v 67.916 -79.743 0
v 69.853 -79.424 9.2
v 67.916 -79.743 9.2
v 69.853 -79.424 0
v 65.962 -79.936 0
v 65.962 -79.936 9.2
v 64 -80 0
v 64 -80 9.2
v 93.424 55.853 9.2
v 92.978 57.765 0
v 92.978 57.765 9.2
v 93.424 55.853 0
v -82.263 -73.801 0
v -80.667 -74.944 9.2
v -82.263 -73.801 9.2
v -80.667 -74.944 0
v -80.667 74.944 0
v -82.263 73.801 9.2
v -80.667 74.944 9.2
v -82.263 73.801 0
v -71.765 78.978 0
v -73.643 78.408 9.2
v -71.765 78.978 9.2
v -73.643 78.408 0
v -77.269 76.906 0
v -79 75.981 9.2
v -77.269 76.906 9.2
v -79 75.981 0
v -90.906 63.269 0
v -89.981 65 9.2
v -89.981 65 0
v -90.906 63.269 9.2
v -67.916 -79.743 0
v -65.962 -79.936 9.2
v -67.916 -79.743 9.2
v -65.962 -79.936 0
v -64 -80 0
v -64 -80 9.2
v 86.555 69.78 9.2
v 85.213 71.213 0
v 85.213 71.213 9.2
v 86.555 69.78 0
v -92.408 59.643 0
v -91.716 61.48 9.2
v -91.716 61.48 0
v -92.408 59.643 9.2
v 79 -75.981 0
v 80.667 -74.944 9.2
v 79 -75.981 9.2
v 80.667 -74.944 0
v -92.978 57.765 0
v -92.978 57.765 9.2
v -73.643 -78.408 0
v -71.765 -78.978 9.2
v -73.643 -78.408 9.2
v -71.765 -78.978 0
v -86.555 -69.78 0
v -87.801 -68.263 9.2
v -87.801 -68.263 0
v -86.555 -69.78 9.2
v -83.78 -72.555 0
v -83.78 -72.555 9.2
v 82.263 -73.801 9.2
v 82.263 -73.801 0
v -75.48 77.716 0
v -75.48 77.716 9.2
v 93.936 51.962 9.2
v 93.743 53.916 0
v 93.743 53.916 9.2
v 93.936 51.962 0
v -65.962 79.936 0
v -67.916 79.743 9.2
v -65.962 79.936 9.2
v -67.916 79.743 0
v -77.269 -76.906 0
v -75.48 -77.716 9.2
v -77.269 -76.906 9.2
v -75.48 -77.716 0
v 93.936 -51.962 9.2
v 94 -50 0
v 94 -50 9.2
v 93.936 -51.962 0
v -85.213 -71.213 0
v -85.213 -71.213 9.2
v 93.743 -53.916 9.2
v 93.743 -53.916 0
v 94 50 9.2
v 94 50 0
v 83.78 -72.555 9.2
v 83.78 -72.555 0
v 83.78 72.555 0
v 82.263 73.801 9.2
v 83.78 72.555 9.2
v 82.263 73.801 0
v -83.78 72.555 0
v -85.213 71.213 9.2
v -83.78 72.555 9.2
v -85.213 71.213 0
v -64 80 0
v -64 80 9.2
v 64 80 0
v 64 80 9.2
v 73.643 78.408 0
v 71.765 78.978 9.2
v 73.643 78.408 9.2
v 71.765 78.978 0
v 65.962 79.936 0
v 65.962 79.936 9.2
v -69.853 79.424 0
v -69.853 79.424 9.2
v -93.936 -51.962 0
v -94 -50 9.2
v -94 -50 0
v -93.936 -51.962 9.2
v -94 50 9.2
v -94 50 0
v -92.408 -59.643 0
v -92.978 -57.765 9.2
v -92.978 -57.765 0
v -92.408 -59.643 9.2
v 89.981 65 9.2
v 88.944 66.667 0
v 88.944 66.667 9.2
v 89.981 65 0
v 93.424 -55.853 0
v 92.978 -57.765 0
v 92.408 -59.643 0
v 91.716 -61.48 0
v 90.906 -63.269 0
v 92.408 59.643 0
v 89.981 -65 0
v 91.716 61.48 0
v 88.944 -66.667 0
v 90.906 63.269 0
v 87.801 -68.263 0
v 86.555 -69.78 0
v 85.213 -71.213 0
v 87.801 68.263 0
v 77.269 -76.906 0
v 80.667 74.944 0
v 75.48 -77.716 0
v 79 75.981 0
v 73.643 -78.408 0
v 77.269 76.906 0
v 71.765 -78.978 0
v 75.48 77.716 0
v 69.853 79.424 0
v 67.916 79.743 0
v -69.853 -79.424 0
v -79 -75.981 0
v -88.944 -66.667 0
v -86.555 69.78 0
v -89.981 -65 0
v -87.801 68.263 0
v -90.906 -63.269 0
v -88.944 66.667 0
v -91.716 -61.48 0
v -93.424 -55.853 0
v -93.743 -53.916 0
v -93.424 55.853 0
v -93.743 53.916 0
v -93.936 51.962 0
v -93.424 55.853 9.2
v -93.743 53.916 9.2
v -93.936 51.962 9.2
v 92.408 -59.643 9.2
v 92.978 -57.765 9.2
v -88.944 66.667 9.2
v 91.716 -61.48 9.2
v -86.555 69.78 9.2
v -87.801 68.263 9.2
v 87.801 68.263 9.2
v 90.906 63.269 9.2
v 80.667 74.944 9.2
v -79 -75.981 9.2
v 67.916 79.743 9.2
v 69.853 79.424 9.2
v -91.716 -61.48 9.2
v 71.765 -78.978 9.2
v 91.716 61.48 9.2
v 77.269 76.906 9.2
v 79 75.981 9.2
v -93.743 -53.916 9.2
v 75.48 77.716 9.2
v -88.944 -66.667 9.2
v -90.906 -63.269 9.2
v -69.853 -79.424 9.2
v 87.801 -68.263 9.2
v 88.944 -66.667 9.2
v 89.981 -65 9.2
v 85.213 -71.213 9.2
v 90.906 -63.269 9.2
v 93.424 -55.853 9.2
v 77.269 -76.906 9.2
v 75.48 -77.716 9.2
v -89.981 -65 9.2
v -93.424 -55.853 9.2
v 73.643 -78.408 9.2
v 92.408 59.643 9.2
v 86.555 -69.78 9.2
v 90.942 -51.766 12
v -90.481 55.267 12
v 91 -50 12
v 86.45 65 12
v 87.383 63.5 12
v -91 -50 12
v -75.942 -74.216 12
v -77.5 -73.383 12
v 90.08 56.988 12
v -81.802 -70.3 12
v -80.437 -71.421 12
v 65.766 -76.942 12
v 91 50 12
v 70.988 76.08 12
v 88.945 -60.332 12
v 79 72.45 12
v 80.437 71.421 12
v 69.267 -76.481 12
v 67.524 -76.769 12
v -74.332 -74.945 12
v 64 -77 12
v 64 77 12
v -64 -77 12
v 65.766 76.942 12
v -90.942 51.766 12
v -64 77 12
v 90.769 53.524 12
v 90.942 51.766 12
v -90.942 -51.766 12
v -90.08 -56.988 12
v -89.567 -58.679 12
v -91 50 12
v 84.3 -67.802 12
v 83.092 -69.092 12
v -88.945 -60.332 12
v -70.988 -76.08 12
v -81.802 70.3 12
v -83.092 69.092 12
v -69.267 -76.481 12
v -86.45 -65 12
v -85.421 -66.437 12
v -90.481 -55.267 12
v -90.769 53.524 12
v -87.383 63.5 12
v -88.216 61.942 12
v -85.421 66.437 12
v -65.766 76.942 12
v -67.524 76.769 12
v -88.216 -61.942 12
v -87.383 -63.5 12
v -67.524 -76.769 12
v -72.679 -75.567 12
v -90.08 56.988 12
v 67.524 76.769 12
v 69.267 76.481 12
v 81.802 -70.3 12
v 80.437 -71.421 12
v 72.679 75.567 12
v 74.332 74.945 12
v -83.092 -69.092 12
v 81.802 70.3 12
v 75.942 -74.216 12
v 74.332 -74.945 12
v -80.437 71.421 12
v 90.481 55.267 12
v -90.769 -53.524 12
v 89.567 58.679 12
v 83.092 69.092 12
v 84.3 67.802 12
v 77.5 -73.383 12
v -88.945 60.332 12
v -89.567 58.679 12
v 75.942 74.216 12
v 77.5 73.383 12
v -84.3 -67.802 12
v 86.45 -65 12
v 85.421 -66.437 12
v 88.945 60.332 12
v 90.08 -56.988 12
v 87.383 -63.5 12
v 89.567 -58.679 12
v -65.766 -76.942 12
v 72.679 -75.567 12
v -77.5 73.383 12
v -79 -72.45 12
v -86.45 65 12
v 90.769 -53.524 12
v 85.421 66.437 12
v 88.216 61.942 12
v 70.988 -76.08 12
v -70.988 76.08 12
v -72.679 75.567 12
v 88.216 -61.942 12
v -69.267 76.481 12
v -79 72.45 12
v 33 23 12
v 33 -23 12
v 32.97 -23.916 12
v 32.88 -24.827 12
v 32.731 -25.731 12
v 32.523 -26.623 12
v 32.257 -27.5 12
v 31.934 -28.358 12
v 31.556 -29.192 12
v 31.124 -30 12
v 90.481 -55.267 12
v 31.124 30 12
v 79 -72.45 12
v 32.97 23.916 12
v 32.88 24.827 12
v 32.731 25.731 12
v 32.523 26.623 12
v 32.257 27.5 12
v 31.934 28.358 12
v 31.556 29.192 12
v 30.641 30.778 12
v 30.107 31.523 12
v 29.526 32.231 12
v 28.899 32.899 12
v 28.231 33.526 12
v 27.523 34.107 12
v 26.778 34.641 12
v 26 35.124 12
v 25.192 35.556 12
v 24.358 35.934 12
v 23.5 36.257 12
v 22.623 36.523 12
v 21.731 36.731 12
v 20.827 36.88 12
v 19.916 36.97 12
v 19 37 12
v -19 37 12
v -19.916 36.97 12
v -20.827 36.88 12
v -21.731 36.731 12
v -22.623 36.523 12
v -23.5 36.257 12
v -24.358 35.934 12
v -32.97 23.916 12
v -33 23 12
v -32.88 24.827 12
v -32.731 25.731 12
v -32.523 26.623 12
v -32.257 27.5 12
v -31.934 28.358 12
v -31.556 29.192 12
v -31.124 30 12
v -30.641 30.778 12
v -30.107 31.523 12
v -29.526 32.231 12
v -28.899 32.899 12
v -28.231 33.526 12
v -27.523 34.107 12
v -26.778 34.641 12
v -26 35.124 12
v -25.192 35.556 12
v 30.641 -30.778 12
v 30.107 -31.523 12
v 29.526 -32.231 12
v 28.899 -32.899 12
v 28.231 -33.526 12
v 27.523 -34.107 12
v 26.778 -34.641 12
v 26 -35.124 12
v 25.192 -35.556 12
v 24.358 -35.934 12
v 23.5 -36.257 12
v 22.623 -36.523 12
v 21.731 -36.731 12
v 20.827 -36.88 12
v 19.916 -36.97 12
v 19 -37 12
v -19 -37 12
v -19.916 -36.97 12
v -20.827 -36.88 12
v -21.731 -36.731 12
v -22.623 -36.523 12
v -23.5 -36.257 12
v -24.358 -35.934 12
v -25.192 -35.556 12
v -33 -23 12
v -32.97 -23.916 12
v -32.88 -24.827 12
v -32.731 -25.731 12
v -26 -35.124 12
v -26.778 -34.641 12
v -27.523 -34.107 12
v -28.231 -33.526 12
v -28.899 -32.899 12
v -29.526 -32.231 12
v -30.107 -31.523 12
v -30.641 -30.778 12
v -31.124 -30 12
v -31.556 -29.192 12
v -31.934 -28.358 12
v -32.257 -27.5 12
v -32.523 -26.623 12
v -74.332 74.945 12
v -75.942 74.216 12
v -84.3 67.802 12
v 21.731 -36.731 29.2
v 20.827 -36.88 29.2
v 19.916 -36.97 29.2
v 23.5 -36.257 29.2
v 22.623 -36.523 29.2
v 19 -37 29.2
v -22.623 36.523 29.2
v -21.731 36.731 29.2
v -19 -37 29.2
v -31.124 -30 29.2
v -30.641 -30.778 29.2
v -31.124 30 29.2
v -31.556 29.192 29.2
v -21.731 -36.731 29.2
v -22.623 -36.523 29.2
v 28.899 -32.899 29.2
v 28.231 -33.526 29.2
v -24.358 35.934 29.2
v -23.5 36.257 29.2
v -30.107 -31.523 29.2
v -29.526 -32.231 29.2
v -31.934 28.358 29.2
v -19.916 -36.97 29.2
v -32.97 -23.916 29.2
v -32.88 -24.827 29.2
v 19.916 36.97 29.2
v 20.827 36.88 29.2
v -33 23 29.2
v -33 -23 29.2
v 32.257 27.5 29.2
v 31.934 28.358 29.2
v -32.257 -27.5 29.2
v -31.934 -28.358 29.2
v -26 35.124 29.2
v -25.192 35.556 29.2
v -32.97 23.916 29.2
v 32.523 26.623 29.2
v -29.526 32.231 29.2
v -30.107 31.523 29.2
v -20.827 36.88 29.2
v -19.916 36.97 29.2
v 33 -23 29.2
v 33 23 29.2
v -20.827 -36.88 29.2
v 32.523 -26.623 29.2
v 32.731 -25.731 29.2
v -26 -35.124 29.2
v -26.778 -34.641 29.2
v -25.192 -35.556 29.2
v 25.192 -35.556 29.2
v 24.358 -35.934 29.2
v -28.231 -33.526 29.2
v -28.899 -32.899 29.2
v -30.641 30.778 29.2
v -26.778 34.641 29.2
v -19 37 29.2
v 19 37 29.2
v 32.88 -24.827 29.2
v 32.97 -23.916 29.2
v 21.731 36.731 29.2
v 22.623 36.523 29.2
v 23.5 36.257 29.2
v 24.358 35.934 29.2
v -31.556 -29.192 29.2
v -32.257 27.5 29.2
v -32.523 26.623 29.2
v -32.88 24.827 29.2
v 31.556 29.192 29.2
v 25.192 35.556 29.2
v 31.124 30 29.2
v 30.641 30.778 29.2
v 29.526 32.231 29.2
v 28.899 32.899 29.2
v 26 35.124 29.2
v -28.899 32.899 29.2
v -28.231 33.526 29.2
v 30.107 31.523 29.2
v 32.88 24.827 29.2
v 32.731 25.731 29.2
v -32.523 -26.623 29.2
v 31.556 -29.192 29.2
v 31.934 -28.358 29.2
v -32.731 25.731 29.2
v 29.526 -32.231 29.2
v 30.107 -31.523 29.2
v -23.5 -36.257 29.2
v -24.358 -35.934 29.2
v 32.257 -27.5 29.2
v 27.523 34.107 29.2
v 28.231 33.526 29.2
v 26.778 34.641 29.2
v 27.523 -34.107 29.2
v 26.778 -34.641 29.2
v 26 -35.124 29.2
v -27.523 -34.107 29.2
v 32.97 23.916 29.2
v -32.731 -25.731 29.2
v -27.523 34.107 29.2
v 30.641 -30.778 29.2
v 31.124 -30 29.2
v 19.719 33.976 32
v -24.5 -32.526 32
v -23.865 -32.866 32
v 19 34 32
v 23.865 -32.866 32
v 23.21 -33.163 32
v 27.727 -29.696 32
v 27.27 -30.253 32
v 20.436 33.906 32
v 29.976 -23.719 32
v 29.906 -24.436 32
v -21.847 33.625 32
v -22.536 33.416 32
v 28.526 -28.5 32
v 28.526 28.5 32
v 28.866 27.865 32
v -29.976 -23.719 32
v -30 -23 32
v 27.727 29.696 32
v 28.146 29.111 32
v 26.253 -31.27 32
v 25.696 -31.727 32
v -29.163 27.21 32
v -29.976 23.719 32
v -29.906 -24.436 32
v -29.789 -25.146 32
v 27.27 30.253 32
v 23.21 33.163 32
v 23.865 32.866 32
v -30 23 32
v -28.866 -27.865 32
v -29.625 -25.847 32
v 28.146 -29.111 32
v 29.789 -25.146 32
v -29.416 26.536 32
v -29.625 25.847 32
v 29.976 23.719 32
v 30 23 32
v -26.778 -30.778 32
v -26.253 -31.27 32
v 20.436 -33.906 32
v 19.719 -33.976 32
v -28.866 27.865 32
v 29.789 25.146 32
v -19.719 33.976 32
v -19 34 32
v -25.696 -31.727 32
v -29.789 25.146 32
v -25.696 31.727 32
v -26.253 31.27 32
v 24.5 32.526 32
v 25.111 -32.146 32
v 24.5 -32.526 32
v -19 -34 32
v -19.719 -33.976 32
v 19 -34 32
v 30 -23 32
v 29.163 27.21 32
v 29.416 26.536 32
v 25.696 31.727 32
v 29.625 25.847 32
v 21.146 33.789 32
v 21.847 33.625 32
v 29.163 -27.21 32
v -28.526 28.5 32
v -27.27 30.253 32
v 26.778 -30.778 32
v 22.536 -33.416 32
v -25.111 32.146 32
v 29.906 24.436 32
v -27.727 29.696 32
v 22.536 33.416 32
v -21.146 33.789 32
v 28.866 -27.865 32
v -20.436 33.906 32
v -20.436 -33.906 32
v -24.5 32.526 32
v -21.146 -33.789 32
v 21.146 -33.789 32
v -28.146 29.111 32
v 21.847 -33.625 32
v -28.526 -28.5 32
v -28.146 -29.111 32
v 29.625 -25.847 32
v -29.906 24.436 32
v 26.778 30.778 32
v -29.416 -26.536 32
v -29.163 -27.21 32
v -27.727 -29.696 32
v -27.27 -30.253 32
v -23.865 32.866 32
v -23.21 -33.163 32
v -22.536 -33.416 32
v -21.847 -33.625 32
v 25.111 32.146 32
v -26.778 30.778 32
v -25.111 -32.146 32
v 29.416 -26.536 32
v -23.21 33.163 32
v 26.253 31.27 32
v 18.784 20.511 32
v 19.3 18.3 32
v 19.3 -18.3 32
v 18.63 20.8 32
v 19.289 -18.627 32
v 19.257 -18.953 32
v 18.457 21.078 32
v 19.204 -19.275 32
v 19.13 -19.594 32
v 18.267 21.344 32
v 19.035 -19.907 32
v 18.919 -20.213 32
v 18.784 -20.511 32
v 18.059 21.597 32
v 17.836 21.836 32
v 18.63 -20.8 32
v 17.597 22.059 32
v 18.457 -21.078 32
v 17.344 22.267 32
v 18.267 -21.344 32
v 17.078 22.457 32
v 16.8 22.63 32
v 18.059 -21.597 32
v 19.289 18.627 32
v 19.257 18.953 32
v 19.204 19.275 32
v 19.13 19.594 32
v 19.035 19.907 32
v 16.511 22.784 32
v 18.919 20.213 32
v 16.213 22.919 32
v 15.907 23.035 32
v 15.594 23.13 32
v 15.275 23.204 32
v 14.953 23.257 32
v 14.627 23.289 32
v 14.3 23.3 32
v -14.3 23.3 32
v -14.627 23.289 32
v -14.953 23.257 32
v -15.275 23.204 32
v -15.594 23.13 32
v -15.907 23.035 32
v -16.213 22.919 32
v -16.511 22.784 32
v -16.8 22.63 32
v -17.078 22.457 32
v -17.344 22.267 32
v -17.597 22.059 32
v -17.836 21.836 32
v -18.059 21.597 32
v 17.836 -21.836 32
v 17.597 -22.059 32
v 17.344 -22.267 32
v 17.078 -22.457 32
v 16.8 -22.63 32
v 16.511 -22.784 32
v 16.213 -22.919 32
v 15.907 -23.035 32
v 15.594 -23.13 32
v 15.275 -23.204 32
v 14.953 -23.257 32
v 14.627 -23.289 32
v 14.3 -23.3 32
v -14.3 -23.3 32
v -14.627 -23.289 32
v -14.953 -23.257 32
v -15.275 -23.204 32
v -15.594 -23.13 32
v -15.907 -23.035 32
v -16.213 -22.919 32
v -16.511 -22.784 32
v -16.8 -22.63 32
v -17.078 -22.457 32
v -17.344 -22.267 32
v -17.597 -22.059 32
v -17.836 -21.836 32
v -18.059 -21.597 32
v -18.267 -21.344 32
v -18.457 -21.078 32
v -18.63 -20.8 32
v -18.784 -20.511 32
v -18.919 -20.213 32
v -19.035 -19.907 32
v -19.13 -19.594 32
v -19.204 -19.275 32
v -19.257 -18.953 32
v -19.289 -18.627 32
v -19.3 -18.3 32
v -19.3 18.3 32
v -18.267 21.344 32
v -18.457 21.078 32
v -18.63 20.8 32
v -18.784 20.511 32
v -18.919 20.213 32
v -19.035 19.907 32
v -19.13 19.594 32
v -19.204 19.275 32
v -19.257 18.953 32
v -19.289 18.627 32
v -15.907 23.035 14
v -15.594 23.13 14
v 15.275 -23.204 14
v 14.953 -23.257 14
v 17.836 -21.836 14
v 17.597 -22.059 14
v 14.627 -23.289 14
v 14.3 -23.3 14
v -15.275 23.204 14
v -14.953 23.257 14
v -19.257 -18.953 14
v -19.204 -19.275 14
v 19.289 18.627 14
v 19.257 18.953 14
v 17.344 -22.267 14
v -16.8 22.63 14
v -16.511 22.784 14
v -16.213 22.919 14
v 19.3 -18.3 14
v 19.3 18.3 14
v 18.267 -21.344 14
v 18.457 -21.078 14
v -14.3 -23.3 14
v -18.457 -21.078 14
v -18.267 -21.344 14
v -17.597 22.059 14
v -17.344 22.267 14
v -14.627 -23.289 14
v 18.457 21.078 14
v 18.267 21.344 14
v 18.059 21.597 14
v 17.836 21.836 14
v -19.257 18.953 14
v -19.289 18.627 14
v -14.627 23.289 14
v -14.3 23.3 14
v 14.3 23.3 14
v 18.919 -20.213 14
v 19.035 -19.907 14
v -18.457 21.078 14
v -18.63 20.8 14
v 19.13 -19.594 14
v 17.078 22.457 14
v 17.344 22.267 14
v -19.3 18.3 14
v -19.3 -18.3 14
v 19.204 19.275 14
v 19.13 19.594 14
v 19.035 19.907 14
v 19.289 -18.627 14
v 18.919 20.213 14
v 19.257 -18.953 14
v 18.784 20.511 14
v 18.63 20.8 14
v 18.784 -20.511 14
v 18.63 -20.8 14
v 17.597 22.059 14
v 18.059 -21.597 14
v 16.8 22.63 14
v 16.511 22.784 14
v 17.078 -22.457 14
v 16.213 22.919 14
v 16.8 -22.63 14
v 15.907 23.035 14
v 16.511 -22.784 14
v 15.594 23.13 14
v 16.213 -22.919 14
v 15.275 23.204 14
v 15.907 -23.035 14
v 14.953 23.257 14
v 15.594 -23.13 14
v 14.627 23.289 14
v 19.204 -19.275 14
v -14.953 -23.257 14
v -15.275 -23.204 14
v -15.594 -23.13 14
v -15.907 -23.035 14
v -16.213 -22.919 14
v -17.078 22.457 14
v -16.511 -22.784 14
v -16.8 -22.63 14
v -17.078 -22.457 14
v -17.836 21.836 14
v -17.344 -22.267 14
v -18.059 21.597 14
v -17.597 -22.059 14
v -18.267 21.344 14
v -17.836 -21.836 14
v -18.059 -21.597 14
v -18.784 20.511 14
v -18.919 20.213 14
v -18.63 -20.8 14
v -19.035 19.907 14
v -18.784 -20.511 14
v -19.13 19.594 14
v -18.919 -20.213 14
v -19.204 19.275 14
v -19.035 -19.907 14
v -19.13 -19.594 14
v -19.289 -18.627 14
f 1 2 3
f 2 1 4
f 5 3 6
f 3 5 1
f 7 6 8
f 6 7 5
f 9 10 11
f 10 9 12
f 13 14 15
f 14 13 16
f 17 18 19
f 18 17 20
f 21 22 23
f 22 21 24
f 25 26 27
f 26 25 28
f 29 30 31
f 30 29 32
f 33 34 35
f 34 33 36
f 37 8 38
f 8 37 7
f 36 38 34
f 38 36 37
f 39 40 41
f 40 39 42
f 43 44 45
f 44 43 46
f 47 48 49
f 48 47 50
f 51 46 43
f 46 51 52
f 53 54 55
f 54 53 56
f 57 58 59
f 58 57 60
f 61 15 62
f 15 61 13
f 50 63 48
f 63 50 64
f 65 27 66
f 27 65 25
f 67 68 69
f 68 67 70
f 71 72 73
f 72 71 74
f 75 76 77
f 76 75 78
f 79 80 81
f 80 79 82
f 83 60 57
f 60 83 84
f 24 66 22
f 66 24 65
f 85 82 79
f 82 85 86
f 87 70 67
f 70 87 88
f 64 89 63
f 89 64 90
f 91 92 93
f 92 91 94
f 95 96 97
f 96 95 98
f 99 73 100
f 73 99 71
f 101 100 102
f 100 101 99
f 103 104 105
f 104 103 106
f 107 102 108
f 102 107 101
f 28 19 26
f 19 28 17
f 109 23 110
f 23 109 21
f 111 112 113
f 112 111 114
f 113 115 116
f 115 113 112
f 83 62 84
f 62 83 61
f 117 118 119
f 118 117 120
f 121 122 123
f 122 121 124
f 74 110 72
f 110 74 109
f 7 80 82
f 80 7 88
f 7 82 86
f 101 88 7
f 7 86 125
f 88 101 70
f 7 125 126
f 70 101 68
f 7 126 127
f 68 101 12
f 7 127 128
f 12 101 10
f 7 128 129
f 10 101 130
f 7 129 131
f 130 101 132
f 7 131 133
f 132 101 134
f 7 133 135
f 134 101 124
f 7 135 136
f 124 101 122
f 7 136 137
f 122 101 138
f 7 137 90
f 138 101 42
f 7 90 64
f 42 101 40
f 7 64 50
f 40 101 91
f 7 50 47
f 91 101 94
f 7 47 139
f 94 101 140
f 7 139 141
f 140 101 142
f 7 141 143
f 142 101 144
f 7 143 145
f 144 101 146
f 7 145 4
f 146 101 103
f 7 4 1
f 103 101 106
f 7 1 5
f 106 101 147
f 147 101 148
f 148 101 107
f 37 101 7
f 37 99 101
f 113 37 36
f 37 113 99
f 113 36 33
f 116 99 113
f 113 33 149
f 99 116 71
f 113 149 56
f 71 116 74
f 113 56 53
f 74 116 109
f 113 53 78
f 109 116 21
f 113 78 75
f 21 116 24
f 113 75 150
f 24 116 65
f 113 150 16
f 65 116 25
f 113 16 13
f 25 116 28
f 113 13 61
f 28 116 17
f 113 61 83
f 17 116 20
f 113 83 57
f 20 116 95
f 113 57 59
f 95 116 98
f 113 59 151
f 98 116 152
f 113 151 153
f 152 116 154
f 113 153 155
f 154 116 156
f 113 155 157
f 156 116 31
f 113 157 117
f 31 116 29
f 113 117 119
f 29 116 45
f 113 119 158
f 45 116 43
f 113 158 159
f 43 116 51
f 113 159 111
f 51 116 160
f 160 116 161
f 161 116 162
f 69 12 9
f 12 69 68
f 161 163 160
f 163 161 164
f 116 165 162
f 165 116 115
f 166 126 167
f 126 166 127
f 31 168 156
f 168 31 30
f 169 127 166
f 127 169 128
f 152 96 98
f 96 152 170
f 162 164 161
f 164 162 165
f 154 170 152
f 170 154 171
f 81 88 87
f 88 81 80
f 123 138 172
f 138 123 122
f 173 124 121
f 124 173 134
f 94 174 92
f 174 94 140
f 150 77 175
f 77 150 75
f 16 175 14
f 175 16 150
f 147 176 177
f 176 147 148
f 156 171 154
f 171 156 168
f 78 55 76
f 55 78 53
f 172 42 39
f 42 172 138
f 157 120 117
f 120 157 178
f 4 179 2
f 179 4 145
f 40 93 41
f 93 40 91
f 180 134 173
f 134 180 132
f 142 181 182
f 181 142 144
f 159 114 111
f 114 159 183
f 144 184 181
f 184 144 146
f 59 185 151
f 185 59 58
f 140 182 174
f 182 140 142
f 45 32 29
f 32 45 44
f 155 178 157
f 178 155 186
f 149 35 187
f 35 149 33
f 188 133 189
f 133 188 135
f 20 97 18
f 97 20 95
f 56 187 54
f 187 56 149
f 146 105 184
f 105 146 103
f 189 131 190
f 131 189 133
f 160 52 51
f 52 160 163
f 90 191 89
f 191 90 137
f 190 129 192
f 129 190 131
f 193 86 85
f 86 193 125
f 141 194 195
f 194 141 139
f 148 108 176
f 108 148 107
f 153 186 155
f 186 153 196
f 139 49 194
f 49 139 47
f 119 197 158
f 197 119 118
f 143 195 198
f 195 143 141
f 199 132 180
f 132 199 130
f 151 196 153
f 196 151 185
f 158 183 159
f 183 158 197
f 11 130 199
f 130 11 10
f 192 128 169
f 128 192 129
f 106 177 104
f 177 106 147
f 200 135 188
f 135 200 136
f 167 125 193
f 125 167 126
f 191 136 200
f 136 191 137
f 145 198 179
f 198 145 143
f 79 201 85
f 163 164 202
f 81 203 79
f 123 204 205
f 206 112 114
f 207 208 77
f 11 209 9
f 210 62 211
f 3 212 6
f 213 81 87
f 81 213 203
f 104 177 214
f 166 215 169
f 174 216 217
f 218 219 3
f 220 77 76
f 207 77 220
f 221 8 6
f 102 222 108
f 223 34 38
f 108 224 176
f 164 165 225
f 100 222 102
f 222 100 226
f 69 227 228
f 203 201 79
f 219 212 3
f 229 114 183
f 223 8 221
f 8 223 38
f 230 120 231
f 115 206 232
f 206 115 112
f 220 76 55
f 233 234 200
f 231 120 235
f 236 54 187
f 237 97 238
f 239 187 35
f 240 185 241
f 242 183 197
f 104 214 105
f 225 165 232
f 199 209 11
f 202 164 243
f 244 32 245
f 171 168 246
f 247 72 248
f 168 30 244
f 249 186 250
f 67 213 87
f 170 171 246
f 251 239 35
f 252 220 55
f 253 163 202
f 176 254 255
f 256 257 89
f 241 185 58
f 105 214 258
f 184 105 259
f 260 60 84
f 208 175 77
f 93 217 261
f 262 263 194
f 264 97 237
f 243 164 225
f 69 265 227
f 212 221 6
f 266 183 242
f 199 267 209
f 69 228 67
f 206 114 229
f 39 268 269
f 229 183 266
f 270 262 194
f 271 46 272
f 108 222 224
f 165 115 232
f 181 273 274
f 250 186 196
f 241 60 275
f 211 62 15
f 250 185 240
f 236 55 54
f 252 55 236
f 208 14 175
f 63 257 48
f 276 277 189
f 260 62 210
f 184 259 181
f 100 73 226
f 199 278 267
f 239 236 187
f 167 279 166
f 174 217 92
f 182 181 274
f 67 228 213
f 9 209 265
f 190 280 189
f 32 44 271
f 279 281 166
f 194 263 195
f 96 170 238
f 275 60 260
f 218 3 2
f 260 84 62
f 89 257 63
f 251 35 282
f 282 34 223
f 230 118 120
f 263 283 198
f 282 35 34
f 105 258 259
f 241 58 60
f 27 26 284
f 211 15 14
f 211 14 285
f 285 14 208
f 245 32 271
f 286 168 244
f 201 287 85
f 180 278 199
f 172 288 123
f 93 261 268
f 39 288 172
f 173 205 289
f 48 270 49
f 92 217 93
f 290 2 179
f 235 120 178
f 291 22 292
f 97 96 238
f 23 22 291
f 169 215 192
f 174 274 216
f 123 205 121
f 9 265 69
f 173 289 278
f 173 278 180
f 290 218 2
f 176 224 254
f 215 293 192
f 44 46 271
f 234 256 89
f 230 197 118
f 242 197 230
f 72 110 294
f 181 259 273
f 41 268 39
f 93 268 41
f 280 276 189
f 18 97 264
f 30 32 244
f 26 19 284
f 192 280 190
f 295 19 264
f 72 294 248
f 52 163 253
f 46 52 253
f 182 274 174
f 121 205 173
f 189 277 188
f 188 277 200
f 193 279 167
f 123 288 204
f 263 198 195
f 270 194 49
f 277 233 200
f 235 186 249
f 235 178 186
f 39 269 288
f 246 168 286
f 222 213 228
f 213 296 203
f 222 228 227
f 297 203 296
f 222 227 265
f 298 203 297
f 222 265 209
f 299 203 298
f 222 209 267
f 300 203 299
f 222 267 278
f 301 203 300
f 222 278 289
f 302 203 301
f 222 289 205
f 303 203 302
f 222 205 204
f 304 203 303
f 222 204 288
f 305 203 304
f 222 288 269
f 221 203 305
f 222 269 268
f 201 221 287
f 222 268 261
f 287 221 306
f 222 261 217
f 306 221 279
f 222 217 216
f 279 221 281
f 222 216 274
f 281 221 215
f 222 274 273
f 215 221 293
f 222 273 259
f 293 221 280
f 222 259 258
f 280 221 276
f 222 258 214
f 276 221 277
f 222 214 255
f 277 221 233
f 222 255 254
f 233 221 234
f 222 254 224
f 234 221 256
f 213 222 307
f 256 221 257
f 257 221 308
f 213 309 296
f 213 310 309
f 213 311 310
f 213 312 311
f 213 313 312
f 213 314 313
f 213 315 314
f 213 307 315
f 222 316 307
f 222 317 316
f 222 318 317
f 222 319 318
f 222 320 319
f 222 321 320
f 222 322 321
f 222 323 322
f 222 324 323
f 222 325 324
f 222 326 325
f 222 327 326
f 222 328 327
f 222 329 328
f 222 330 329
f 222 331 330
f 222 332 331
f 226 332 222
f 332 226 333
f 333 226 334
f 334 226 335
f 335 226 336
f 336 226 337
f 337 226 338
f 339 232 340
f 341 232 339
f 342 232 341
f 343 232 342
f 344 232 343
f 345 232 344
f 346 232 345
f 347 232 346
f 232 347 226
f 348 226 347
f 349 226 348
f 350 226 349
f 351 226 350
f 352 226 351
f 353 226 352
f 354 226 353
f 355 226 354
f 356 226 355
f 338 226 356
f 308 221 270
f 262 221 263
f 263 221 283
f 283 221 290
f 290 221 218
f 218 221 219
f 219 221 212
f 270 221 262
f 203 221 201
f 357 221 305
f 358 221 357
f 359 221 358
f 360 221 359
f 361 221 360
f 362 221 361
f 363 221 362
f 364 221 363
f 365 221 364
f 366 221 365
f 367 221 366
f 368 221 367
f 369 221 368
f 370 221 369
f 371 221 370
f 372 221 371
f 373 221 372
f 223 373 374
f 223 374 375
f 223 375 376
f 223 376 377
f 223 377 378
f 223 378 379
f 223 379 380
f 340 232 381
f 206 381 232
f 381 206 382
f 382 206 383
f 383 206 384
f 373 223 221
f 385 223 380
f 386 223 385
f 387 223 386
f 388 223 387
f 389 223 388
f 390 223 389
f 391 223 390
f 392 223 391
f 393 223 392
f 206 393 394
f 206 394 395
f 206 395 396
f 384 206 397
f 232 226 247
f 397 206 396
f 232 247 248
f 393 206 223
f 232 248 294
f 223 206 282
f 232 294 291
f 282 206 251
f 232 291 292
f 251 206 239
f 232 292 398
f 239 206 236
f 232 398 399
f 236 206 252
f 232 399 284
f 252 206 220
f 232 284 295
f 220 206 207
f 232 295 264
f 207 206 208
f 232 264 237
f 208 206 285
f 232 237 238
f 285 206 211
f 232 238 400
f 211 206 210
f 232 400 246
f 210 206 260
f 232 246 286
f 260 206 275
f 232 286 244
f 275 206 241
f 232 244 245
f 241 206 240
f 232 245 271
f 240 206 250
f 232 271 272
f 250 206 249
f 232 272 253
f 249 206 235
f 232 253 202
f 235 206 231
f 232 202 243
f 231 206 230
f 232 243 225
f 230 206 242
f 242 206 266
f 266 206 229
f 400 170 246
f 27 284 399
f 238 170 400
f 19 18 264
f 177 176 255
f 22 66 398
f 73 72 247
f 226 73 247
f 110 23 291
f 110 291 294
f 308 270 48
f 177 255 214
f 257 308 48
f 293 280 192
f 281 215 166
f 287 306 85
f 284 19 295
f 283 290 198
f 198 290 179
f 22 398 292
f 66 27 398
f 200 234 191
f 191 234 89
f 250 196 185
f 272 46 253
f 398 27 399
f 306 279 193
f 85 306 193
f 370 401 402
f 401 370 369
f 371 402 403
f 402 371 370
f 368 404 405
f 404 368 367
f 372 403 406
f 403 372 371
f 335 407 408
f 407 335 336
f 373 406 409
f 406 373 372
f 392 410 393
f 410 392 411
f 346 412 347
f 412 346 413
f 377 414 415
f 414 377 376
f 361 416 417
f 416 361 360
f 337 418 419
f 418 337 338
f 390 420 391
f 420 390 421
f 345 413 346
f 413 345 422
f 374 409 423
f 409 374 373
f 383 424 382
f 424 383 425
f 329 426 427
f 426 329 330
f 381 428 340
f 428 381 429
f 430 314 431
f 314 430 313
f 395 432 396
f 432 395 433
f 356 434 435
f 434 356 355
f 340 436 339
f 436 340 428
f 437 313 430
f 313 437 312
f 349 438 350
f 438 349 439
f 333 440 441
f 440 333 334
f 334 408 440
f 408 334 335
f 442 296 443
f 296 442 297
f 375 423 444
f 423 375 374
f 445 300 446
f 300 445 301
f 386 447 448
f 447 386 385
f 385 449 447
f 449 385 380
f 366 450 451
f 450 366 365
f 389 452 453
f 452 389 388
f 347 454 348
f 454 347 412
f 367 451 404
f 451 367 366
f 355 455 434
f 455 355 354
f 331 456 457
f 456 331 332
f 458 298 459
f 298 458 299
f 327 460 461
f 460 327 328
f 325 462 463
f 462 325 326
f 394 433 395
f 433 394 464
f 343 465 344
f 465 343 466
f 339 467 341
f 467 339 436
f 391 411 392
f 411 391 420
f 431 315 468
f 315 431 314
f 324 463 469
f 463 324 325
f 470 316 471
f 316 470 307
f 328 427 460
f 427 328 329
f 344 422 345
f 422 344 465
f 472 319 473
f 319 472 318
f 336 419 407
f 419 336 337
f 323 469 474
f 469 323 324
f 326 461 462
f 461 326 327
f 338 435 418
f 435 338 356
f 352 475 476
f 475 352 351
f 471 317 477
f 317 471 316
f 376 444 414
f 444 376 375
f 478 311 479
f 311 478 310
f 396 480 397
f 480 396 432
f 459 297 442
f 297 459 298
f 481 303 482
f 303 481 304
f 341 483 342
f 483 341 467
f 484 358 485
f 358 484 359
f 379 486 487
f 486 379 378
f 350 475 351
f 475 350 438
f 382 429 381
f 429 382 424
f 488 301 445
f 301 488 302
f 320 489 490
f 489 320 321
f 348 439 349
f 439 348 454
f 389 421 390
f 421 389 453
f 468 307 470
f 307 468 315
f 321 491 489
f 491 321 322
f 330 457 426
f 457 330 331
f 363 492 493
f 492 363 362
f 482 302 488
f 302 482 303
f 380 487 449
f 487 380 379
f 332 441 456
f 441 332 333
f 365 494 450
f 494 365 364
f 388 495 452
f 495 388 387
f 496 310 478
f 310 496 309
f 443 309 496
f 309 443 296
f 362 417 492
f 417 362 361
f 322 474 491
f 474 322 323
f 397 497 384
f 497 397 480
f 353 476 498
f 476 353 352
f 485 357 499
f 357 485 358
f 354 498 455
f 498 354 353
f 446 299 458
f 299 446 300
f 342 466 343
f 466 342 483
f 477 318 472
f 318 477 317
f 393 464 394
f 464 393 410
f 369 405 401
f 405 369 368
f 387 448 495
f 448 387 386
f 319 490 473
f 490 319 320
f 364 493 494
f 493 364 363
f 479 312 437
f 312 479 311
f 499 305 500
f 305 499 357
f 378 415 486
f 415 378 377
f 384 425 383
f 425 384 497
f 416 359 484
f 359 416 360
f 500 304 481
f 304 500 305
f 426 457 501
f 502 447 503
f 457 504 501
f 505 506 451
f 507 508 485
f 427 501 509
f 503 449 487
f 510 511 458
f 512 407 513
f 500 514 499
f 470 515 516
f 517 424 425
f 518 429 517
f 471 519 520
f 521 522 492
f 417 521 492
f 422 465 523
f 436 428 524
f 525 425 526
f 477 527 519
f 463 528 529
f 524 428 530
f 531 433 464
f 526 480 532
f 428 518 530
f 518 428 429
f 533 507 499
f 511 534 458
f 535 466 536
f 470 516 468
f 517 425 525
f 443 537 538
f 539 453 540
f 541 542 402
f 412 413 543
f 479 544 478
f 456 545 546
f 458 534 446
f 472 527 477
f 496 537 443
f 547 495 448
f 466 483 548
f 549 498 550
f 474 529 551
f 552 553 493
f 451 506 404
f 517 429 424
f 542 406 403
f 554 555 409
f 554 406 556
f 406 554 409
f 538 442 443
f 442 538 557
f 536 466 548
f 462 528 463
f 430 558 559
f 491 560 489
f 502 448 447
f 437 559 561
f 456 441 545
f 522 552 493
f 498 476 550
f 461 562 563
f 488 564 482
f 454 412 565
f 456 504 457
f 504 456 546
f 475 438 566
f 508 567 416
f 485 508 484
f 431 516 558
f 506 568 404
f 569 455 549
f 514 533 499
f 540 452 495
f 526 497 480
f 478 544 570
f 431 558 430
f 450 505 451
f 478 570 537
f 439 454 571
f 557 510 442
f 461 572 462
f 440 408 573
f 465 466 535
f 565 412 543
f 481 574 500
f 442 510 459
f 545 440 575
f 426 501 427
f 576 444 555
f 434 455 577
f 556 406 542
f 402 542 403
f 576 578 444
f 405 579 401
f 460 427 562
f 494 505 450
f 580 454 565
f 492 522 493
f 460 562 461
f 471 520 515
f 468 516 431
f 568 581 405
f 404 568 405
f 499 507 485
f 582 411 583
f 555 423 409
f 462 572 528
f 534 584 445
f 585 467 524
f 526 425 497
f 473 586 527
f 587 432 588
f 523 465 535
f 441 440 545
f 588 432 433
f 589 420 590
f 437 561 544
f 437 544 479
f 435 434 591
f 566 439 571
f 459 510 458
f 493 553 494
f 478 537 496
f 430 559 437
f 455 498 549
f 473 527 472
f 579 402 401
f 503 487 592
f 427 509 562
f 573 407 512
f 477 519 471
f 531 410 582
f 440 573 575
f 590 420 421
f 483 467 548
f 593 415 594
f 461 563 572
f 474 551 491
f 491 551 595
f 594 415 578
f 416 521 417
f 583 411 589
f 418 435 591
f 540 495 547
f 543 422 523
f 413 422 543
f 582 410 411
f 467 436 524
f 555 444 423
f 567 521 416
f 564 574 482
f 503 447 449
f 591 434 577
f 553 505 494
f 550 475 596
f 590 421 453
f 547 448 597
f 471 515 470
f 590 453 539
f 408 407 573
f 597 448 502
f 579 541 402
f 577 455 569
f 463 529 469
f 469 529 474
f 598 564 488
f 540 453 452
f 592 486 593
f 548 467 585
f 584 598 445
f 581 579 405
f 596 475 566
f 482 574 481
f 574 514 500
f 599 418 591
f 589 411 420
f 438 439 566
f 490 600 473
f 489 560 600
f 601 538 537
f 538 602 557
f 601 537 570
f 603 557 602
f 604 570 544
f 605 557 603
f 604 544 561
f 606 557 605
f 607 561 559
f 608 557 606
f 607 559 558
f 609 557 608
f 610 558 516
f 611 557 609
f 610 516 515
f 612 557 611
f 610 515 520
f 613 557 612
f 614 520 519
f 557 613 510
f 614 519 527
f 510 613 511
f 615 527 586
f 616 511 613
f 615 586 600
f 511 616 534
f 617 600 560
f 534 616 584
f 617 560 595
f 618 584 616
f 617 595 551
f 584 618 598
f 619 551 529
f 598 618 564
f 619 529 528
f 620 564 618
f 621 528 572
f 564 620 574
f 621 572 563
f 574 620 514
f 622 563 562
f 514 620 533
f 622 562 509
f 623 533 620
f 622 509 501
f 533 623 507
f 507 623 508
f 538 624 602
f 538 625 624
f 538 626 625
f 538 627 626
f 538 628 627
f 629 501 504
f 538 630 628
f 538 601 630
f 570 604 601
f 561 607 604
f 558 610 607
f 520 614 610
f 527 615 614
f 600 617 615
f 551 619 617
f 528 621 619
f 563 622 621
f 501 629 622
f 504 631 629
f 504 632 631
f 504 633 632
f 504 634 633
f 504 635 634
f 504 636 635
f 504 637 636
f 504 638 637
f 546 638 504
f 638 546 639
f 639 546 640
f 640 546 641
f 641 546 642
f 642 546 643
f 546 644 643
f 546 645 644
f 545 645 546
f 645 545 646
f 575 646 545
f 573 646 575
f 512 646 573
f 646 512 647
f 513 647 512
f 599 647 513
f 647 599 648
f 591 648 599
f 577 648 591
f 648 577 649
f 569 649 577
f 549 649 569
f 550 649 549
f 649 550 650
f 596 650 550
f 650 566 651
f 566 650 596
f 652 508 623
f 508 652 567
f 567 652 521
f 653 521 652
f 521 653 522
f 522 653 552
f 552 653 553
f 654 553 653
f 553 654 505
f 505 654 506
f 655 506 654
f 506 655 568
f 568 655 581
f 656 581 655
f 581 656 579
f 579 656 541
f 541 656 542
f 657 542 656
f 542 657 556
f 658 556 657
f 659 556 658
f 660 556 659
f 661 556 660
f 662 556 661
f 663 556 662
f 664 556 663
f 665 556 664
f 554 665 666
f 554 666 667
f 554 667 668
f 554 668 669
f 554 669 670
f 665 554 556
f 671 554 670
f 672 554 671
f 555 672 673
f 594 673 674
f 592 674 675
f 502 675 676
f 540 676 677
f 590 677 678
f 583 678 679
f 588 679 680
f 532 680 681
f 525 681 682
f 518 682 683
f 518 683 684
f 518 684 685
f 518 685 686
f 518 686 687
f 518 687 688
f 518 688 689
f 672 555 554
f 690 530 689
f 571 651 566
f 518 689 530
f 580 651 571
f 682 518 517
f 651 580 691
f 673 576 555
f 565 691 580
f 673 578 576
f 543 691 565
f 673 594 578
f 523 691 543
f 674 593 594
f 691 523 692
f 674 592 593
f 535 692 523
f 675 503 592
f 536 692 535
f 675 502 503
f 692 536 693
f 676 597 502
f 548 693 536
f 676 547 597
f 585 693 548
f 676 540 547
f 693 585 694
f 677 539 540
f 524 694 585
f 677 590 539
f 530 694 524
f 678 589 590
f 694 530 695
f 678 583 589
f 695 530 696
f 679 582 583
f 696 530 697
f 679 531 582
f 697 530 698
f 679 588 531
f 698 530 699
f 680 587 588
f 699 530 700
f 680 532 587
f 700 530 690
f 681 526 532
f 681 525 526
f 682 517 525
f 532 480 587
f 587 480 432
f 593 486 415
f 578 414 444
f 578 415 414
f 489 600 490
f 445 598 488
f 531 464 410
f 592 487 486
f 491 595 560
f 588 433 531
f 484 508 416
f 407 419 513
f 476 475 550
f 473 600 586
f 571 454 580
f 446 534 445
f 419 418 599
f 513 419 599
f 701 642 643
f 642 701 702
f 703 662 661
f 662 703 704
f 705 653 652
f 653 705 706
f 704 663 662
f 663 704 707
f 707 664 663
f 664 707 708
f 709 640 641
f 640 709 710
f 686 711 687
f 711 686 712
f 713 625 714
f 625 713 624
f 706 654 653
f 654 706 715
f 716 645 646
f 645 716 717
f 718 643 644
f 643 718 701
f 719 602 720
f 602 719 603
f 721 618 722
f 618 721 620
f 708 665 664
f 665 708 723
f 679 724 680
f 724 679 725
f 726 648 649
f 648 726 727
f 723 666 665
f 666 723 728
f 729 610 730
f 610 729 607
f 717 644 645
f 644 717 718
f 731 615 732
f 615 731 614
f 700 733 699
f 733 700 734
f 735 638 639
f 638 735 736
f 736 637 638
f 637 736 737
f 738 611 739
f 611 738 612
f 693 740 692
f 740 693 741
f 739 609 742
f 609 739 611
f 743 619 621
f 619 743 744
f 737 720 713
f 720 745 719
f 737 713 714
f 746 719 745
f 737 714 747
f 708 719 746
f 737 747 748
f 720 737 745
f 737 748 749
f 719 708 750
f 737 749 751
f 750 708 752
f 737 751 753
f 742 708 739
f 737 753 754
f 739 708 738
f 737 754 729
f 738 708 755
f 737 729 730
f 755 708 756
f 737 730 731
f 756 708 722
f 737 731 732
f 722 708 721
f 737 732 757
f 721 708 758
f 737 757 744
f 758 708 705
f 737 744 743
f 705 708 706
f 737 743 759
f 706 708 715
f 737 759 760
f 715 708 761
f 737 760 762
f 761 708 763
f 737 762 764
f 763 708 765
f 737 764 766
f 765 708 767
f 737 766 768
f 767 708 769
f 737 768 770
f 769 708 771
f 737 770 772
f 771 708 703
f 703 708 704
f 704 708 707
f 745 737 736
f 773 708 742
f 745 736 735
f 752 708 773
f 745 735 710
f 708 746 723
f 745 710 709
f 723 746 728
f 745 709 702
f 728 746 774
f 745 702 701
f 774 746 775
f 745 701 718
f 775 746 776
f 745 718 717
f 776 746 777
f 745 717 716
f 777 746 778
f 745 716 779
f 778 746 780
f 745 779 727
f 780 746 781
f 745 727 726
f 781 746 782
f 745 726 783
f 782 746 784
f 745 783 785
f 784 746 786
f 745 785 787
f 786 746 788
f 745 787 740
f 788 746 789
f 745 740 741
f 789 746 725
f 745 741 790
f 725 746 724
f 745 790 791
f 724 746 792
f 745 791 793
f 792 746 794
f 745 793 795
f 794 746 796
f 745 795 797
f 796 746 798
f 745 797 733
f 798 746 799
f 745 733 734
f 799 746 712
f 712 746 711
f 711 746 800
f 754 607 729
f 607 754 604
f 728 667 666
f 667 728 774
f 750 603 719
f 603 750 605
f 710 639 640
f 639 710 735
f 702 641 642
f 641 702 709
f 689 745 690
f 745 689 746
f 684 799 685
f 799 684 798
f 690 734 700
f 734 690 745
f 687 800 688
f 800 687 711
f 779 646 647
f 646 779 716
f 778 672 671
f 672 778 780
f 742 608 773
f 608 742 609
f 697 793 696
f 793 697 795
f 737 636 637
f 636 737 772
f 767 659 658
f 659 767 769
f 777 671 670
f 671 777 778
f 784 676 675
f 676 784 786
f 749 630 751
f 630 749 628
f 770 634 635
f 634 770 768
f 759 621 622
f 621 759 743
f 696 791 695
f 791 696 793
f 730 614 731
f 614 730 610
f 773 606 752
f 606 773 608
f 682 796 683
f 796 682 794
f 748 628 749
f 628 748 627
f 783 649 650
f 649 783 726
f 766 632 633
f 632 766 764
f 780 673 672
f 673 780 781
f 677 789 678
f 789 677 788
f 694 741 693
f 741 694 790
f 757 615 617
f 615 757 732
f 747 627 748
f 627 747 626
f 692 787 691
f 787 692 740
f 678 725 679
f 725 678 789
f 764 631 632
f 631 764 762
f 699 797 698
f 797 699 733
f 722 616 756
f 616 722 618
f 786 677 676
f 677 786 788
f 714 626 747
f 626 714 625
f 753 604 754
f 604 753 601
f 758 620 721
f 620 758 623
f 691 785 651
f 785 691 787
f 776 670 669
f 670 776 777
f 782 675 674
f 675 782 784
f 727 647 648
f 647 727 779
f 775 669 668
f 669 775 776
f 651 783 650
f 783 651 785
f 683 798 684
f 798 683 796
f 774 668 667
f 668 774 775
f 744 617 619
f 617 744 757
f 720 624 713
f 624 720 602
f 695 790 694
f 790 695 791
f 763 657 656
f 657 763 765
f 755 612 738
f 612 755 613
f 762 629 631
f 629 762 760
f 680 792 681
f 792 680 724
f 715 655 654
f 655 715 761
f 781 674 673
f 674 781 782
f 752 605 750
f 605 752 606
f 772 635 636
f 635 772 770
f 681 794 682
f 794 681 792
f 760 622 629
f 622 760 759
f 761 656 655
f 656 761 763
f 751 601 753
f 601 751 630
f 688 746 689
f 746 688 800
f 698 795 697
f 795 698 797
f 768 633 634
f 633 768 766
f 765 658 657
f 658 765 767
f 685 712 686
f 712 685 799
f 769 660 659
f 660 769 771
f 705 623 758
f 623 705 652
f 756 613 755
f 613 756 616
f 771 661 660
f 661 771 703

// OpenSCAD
// Headphone stand in three printable parts: base, post, hanger.
// No glue, no screws. Rectangular (non-round) blade tenons prevent spinning.
// All dimensions in mm. Print orientation is the exported orientation (+Z up).
//
// Assembly heights (assembly coordinates, desk at z=0):
//   base plate/boss top        0 .. 32
//   post                       14.5 .. 250  (17.5 mm of it inside the base socket)
//   hanger tenon               228.5 .. 250 (21.5 mm inside the post socket)
//   hanger saddle top centre   270
// Socket clearances: 0.3 mm per side (socket is tenon + 0.6 in each dimension),
// tenon tips stop 0.5 mm above socket floors; shoulders/faces give the depth stop
// for the hanger, and the post bottoms in its socket.

part = "base"; // [base, post, hanger, assembly]
cadverify_only = "";

$fn = 96;

/* [Base] */
base_w = 188;          // desk footprint, X
base_d = 160;          // desk footprint, Y
base_plate_top = 9;    // straight plate wall up to here, then 45 deg chamfer to 12
base_top_plate = 12;
boss_w = 66;
boss_d = 74;
boss_straight_top = 29; // then 45 deg chamfer to boss_top
boss_top = 32;
base_socket_w = 38.6;  // post 38 + 0.6
base_socket_d = 46.6;  // post 46 + 0.6
base_socket_floor = 14;

/* [Post] */
post_w = 38;
post_d = 46;
post_len = 235.5;      // tip (local z=0) to top (assembly 250)
post_top_socket_w = 24.6; // hanger tenon 24 + 0.6
post_top_socket_d = 34.6; // hanger tenon 34 + 0.6
post_top_socket_floor_local = 213.5; // assembly 228

/* [Hanger, modelled in print coordinates] */
// Print coordinates: X = saddle length, Y = height above tenon tip,
// Z = saddle width direction (part lies on its Z=0 side face on the bed).
hang_len_half = 69;    // overall saddle half length incl. rounded end point
hang_width = 34;       // >= 30 mm headband support width
hang_top_rel = 41.5;   // tenon tip to saddle crown; assembly 228.5 + 41.5 = 270
hang_arc_r = 170;      // crown radius of the headband contact surface
hang_plate_t = 10;     // saddle plate thickness (vertical, in profile)
hang_tenon_half_w = 12;  // tenon is 24 (X) x 34 (width)
hang_shoulder_rel = 21.5; // assembly 250, post top
hang_neck_half_w = 17;

function hang_top_z(x) = hang_top_rel - (hang_arc_r - sqrt(hang_arc_r*hang_arc_r - x*x));
function hang_bot_z(x) = hang_top_z(x) - hang_plate_t;

module rounded_rect(w, d, r) {
    offset(r = r) square([w - 2*r, d - 2*r], center = true);
}

module instance(name, part_name, unit = 1) {
    echo(cadverify_instance = [name, part_name, unit]);
    if (cadverify_only == "" || cadverify_only == name) children();
}

/* ---------- BASE (print = assembly orientation) ---------- */
module base_part() {
    difference() {
        // Outer corners of the plate and boss are rounded in plan view (corner
        // radius >= 6 mm) and the top rims have 45 deg x 3 mm chamfers, so
        // nothing sticks out beyond the bounding box or the support plane.
        union() {
            // desk plate with 45 deg top edge chamfer
            linear_extrude(base_plate_top) rounded_rect(base_w, base_d, 30);
            hull() {
                translate([0, 0, base_plate_top]) linear_extrude(0.2)
                    rounded_rect(base_w, base_d, 30);
                translate([0, 0, base_top_plate - 0.2]) linear_extrude(0.2)
                    rounded_rect(base_w - 6, base_d - 6, 27);
            }
            // raised boss / collar around the post socket, 45 deg top chamfer
            translate([0, 0, base_top_plate])
                linear_extrude(boss_straight_top - base_top_plate)
                    rounded_rect(boss_w, boss_d, 14);
            hull() {
                translate([0, 0, boss_straight_top]) linear_extrude(0.2)
                    rounded_rect(boss_w, boss_d, 14);
                translate([0, 0, boss_top - 0.2]) linear_extrude(0.2)
                    rounded_rect(boss_w - 6, boss_d - 6, 11);
            }
        }
        // blind rectangular socket for the post (stops post spinning)
        translate([0, 0, base_socket_floor])
            linear_extrude(boss_top - base_socket_floor + 2)
                rounded_rect(base_socket_w, base_socket_d, 5);
    }
}

/* ---------- POST (printed upright, local z=0 is tenon tip) ---------- */
module post_part() {
    difference() {
        // Solid rectangular column, corners rounded 8 mm in plan view.
        linear_extrude(post_len) rounded_rect(post_w, post_d, 8);
        // Blind rectangular socket in the top for the hanger blade tenon:
        // tenon + 0.6 mm per side (0.3 mm clearance); the non-round rectangle
        // is what stops the hanger spinning on the post.
        translate([0, 0, post_top_socket_floor_local])
            linear_extrude(post_len - post_top_socket_floor_local + 2)
                rounded_rect(post_top_socket_w, post_top_socket_d, 5);
    }
}

/* ---------- HANGER (printed on its side) ---------- */
module hanger_part() {
    top_pts    = [for (x = [56 : -8 : -56]) [x, hang_top_z(x)]];
    bot_r_pts  = [for (x = [40 : 8 : 64]) [x, hang_bot_z(x)]];
    bot_l_pts  = [for (x = [-64 : 8 : -40]) [x, hang_bot_z(x)]];
    mid64 = (hang_top_z(64) + hang_bot_z(64)) / 2;
    // Saddle/neck profile above the shoulder plane (print y = hang_shoulder_rel).
    profile = concat(
        [[-hang_neck_half_w, hang_shoulder_rel], [hang_neck_half_w, hang_shoulder_rel],
         [30, hang_bot_z(30)]],
        bot_r_pts,
        [[hang_len_half - 0.5, mid64], [64, hang_top_z(64)]],
        top_pts,
        [[-64, hang_top_z(64)], [-(hang_len_half - 0.5), mid64], [-64, hang_bot_z(64)]],
        bot_l_pts,
        [[-30, hang_bot_z(30)]]
    );
    difference() {
        union() {
            linear_extrude(hang_width) polygon(profile);
            // Blade tenon below the shoulder: 24 x 34 with 4 mm corner radii,
            // so it clears the post socket's 5 mm rounded corners. It reaches
            // 2 mm up into the neck so the union is volumetric, not face-only.
            translate([0, 0, hang_width/2]) rotate([-90, 0, 0])
                linear_extrude(hang_shoulder_rel + 2)
                    rounded_rect(2*hang_tenon_half_w, hang_width, 4);
        }
        // 45 deg chamfers on the two crown side edges, limited to the central
        // contact zone |x| <= 36. Each box is the half-space beyond its
        // chamfer plane, rotated -45 deg about X from an origin on the plane:
        //   far side keeps Y + Z <= hang_top_z(36) + hang_width
        //   bed side keeps Y - Z <= hang_top_z(36)
        // At |x| = 36 the crown meets the plane, so beyond it the plate keeps
        // its full 34 mm width; at the centre the chamfers leave a ~30.7 mm
        // flat crown. The bed-side chamfer face itself is exactly 45 deg.
        translate([0, hang_top_z(36), hang_width]) rotate([-45, 0, 0])
            translate([-36, 0, 0]) cube([72, 40, 40]);
        translate([0, hang_top_z(36), 0]) rotate([-45, 0, 0])
            translate([-36, 0, 0]) cube([72, 40, 40]);
    }
}

/* ---------- Spec echoes ---------- */
if (part == "base") {
    echo(cadverify_spec = [
        ["bounds", [[-base_w/2, -base_d/2, 0], [base_w/2, base_d/2, boss_top]]],
        ["bodies", 1],
        ["through_holes", 0],
        ["support_faces", [["desk", "-z", 25000]]],
        ["overhangs_allowed", []],
        ["copies", 1],
        ["details", [
            ["plate", "material", [[-80, -60, 2], [80, 60, 10]], 0.99],
            ["boss_wall", "material", [[22, -30, 16], [31, 30, 28]], 0.99],
            ["post_socket", "void", [[-17, -21, 16], [17, 21, 30]], 0.99],
            ["socket_floor", "thickness", [0, 0, 42], [0, 0, -1], base_socket_floor],
            ["boss_socket_top", "view", [[-34, -38, 27], [34, 38, boss_top]]]
        ]]
    ]);
} else if (part == "post") {
    echo(cadverify_spec = [
        ["bounds", [[-post_w/2, -post_d/2, 0], [post_w/2, post_d/2, post_len]]],
        ["bodies", 1],
        ["through_holes", 0],
        ["support_faces", [["bed", "-z", 1500]]],
        ["overhangs_allowed", []],
        ["copies", 1],
        ["details", [
            ["column", "material", [[-16, -20, 30], [16, 20, 200]], 0.99],
            ["hanger_socket", "void", [[-10, -15, 216], [10, 15, 234]], 0.99],
            ["column_width", "thickness", [32, 0, 100], [-1, 0, 0], post_w],
            ["top_socket", "view", [[-19, -23, 210], [19, 23, post_len]]]
        ]]
    ]);
} else if (part == "hanger") {
    // actual extreme points are the saddle end tips at +-(hang_len_half - 0.5)
    echo(cadverify_spec = [
        ["bounds", [[-(hang_len_half - 0.5), 0, 0], [hang_len_half - 0.5, hang_top_rel, hang_width]]],
        ["bodies", 1],
        ["through_holes", 0],
        ["support_faces", [["bed", "-z", 1200]]],
        ["overhangs_allowed", [
            ["45deg crown chamfer on bed side", [[-36, 37, 0], [36, hang_top_rel, 5]]]
        ]],
        ["copies", 1],
        ["details", [
            ["saddle_plate", "material", [[-25, 32, 5], [25, 38, 29]], 0.99],
            ["tenon", "material", [[-10, 2, 5], [10, 20, 29]], 0.99],
            ["saddle_thickness", "thickness", [50, 52, 17], [0, -1, 0], hang_plate_t],
            ["rounded_crown", "view", [[-40, 27, 0], [40, hang_top_rel, hang_width]]]
        ]]
    ]);
} else if (part == "assembly") {
    echo(cadverify_spec = [
        ["bounds", [[-base_w/2, -base_d/2, 0], [base_w/2, base_d/2, 270]]],
        ["support_faces", [["desk", "-z", 25000]]],
        ["allowed_interferences", []],
        ["assembly_order", [
            [["base"], [0, 0, 0]],
            [["post"], [0, 0, -1]],
            [["hanger"], [0, 0, -1]]
        ]]
    ]);
}

/* ---------- Output ---------- */
if (part == "base") {
    base_part();
} else if (part == "post") {
    post_part();
} else if (part == "hanger") {
    hanger_part();
} else if (part == "assembly") {
    instance("base", "base") base_part();
    instance("post", "post") translate([0, 0, 14.5]) post_part();
    // hanger print coords (x, y=height rel. tenon tip, z=width)
    //   -> assembly (x, 17-z, 228.5+y): tenon tip at 228.5, crown at 270
    instance("hanger", "hanger")
        translate([0, hang_width/2, 228.5]) rotate([90, 0, 0]) hanger_part();
} else {
    assert(false, str("unknown part: ", part));
}
